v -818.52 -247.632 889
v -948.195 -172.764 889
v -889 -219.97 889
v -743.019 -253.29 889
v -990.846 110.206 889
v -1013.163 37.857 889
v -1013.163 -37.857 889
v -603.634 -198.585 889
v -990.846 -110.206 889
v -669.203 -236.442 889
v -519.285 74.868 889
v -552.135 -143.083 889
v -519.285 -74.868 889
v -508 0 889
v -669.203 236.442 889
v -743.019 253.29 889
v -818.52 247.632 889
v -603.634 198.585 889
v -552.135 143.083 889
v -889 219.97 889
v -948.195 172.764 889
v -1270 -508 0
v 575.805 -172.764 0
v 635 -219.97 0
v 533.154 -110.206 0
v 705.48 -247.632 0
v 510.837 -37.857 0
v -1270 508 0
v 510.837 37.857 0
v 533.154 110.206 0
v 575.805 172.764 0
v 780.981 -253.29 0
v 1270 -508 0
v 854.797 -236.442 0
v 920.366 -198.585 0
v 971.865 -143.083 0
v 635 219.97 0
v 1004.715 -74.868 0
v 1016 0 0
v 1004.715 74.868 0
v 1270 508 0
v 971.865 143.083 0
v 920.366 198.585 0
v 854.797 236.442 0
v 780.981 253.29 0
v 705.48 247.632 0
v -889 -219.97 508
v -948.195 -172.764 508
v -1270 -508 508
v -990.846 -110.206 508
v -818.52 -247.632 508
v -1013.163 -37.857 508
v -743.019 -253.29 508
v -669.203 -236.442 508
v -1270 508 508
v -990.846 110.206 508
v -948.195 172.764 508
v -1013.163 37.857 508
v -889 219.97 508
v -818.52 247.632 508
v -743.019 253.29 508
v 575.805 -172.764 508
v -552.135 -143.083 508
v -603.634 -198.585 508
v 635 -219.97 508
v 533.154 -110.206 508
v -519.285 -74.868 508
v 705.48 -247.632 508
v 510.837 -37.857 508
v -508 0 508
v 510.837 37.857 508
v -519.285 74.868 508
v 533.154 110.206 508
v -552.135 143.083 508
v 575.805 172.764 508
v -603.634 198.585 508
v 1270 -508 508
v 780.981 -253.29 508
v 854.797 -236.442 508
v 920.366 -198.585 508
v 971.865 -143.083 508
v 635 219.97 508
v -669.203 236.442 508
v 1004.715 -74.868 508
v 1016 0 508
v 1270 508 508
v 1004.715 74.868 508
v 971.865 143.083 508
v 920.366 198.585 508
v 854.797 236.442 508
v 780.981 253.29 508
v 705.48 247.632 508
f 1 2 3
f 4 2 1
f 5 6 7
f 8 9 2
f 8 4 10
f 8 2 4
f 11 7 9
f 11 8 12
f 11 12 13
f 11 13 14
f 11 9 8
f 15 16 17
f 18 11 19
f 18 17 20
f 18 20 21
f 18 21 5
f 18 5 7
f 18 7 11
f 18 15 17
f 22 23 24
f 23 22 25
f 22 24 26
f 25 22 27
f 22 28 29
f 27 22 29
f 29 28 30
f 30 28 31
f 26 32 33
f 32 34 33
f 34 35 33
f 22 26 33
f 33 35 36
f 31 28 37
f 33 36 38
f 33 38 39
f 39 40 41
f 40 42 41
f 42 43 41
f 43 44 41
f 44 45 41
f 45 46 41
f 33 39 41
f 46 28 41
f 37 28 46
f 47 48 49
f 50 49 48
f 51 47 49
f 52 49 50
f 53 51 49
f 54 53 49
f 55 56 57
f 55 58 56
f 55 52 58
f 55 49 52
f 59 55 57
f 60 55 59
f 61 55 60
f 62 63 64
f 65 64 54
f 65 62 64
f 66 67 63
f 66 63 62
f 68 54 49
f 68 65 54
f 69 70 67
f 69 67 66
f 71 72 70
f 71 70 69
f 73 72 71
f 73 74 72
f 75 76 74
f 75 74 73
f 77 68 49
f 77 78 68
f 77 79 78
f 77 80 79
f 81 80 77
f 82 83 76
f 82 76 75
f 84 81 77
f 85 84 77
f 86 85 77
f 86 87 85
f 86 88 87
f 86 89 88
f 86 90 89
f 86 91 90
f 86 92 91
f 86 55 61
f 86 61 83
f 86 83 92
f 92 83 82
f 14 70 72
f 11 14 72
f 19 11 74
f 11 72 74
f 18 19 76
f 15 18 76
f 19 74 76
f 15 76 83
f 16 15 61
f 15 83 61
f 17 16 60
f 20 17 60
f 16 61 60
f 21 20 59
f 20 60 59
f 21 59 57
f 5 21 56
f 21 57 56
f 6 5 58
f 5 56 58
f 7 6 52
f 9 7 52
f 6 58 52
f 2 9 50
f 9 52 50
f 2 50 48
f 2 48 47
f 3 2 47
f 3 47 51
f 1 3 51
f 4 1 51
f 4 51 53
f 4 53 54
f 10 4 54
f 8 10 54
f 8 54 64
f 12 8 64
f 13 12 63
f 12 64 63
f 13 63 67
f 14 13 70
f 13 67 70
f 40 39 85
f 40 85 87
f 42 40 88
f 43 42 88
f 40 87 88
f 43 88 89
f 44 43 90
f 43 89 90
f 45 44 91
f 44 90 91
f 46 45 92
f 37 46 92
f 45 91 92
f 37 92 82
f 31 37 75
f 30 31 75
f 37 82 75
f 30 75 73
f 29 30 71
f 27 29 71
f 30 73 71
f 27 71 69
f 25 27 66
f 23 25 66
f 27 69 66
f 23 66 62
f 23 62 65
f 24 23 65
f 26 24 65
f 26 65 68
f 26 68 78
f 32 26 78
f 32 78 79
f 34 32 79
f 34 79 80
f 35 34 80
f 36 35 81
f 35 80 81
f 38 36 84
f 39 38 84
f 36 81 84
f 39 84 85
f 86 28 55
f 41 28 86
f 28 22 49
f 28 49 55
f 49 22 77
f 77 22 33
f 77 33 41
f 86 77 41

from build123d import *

# Parameters (mm, degrees)
SKETCH1_W           = 2540
SKETCH1_H           = 1016
BOSS_EXTRUDE1_DEPTH = 508
SKETCH2_R           = 254
BOSS_EXTRUDE2_DEPTH = 381
SKETCH3_R           = 254
CUT_EXTRUDE2_DEPTH  = 508


with BuildPart() as part:
    # Sketch1 → Boss-Extrude1 (new body)
    with BuildSketch(Plane.XY):
        Rectangle(SKETCH1_W, SKETCH1_H)
    extrude(amount=BOSS_EXTRUDE1_DEPTH)

    # Sketch2 → Boss-Extrude2 (add)
    with BuildSketch(Plane.XY.offset(508)):
        with Locations((-762, 0)):
            Circle(SKETCH2_R)
    extrude(amount=BOSS_EXTRUDE2_DEPTH)

    # Sketch3 → Cut-Extrude2 (cut)
    with BuildSketch(Plane.XY.offset(508)):
        with Locations((762, 0)):
            Circle(SKETCH3_R)
    extrude(amount=-CUT_EXTRUDE2_DEPTH, mode=Mode.SUBTRACT)


solid = part.part
